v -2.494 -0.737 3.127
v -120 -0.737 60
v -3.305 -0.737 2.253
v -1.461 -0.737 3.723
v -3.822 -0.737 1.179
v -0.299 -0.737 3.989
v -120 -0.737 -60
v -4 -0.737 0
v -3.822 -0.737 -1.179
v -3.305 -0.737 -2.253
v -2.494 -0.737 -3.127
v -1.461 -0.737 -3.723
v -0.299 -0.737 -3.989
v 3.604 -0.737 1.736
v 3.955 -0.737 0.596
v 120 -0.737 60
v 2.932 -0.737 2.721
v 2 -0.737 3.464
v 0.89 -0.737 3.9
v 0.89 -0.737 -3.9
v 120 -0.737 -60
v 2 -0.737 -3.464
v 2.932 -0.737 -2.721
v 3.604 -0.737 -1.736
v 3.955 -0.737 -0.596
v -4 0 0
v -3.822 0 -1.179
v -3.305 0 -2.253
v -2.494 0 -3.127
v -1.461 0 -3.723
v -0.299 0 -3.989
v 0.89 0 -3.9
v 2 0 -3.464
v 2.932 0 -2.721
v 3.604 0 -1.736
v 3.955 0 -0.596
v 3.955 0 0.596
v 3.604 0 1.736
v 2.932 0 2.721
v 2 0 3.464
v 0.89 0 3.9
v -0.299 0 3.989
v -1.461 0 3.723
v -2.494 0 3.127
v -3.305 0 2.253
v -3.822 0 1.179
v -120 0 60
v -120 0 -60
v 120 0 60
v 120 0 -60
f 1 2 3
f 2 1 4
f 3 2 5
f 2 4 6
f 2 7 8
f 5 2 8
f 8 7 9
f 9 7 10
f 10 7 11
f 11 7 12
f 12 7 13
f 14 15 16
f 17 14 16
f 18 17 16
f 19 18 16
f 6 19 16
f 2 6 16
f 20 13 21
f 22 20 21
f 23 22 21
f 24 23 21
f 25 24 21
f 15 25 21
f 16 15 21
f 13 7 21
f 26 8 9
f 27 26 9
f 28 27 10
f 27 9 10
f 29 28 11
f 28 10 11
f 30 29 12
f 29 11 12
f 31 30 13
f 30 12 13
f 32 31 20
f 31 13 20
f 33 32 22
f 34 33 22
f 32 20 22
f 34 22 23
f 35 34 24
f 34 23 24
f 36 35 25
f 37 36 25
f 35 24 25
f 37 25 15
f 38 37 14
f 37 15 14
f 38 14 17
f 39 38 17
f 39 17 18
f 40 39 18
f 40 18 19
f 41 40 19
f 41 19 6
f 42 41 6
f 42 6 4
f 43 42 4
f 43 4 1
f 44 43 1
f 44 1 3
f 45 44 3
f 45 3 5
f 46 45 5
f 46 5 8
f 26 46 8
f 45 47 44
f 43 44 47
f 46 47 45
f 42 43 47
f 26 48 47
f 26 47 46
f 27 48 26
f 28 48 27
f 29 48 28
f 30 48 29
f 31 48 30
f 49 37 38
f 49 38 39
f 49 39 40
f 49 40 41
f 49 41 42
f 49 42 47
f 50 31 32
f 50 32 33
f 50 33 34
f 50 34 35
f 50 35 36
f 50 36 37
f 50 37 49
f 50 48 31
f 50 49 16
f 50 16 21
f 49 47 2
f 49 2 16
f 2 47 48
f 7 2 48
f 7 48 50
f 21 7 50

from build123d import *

# Parameters (mm, degrees)
SKETCH1_W                = 240
SKETCH1_H                = 120
BASE_FLANGE1_DEPTH       = 0.7366
F_4_0_4_DIAMETER_HOLE1_D = 8


# Sheet-metal steps are written as plain solids
with BuildPart() as part:
    # Sketch1 → Base-Flange1 (new body)
    with BuildSketch(Plane(origin=(0, 0, 0), x_dir=(1, 0, 0), z_dir=(0, 1, 0))):
        Rectangle(SKETCH1_W, SKETCH1_H)
    extrude(amount=-BASE_FLANGE1_DEPTH)

    # Ø4.0 (4) Diameter Hole1 (through all)
    with Locations(Plane(origin=(0, 0, 0), x_dir=(1, 0, 0), z_dir=(0, 1, 0))):
        with Locations((0, 0)):
            Hole(F_4_0_4_DIAMETER_HOLE1_D / 2)


solid = part.part
